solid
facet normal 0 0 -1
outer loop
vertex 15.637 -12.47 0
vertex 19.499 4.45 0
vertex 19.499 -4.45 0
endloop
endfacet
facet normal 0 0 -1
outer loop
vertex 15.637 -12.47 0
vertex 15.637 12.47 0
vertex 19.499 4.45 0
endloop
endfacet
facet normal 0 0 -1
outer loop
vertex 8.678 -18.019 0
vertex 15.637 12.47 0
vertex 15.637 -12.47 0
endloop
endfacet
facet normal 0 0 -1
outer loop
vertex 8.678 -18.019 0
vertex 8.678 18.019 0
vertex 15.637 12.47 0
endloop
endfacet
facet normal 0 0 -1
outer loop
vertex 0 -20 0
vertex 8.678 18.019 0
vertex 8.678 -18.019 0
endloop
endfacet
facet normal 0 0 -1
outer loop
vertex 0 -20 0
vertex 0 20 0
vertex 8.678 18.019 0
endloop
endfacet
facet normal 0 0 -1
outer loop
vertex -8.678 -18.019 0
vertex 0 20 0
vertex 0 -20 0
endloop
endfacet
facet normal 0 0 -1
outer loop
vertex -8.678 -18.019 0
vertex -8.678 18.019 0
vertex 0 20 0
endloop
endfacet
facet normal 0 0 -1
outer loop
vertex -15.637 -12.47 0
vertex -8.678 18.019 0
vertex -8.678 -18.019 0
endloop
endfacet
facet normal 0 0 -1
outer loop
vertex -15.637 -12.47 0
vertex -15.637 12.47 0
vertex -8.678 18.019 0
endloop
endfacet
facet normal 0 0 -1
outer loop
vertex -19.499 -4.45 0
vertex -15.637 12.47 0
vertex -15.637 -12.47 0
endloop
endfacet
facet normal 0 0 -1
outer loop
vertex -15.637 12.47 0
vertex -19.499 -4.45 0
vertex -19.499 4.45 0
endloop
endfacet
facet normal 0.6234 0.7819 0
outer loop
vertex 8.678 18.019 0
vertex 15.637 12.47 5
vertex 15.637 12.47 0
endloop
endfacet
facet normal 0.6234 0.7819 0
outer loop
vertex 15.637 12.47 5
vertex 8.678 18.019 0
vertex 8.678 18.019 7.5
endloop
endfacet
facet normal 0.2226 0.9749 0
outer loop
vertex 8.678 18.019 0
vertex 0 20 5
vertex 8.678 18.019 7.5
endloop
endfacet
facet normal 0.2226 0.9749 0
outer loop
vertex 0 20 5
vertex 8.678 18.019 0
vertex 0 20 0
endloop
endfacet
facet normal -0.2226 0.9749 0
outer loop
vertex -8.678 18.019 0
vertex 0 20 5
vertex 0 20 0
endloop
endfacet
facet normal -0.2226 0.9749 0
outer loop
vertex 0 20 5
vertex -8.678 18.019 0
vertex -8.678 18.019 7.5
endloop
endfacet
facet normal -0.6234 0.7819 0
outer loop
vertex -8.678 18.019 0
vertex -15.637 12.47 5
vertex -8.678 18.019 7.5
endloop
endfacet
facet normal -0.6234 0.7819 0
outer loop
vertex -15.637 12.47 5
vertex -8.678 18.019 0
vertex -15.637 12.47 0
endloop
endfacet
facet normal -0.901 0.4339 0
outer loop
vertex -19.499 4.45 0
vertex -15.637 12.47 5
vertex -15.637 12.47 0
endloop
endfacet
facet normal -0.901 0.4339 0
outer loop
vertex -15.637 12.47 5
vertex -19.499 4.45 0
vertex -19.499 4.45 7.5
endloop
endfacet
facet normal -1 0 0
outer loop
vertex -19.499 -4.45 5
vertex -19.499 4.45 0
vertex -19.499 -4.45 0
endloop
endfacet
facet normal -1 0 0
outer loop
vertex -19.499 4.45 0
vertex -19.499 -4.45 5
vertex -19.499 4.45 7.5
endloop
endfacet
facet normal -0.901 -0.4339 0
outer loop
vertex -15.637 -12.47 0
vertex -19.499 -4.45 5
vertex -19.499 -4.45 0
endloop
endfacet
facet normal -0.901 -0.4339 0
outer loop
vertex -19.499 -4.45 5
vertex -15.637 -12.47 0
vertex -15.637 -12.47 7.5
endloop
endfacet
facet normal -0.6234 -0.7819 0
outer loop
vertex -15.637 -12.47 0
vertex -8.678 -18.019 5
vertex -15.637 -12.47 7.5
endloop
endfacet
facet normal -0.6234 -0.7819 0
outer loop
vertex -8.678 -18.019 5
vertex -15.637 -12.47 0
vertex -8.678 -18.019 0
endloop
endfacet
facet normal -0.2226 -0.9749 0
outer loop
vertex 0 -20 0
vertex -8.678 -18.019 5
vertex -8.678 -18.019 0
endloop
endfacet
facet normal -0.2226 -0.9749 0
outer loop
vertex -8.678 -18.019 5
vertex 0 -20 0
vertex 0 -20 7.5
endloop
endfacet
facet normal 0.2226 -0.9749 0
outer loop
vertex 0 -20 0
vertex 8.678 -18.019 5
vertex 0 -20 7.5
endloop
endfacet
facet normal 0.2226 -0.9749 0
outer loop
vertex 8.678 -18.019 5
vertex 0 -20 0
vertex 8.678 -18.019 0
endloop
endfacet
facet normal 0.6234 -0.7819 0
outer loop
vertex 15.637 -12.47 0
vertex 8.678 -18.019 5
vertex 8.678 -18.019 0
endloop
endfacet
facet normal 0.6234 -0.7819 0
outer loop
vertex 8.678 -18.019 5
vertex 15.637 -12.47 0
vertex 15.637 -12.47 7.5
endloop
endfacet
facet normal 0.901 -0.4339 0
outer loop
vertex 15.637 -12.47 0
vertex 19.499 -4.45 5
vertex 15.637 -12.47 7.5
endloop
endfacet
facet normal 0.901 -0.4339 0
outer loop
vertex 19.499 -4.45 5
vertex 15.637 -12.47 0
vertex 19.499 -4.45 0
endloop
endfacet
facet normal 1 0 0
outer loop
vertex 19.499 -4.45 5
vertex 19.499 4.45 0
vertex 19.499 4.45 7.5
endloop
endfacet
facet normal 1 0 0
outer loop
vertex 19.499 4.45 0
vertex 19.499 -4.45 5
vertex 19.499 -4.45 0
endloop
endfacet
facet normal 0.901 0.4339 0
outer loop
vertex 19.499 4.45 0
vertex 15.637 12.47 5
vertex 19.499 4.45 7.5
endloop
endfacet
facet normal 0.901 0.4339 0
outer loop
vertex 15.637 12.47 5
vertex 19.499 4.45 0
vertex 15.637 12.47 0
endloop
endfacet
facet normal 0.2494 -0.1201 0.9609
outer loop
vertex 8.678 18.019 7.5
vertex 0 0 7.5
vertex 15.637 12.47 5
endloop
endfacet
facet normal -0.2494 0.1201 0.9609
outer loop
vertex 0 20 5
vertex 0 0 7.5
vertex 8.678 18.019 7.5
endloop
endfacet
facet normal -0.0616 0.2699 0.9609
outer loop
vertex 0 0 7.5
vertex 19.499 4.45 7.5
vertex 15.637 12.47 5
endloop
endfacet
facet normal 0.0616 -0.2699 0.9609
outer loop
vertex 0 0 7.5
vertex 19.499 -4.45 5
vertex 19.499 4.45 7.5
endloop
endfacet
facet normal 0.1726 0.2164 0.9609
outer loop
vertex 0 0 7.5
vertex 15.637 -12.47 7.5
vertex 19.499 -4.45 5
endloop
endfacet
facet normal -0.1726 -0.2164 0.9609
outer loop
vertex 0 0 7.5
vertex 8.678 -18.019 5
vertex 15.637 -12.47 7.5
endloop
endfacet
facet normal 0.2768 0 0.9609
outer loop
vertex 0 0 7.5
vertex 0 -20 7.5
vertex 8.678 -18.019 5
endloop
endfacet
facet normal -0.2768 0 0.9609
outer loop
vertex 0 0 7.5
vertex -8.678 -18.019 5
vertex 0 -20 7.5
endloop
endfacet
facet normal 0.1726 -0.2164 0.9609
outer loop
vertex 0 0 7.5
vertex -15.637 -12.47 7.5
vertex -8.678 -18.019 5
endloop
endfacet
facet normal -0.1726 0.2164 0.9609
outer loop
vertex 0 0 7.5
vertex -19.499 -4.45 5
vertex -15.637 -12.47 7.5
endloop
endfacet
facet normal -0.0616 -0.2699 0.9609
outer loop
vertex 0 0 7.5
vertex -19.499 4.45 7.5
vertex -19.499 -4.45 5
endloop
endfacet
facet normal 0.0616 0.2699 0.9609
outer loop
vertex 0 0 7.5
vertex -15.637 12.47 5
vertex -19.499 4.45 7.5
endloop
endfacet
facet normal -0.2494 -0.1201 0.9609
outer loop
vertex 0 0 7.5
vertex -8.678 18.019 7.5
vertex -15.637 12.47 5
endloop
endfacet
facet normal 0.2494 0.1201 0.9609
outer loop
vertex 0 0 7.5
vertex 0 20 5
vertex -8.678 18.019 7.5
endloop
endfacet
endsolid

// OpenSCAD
pointCount = 14;
radius = 20;

bottomPoints = [
    for(i = [0 : pointCount - 1]) [
        radius * sin((i / pointCount) * 360),
        radius * cos((i / pointCount) * 360),
        0
    ]
];
middlePoints = [
    for(i = [0 : 2 : pointCount - 1]) [
        radius * sin((i / pointCount) * 360),
        radius * cos((i / pointCount) * 360),
        5
    ]
];
topPoints = [
    for(i = [0 : 2 : pointCount - 1]) [
        radius * sin((i / pointCount) * 360 + 180),
        radius * cos((i / pointCount) * 360 + 180),
        7.5
    ]
];
topMiddle = [0, 0, 7.5];
bottomMiddle = [0, 0, 0];
echo(middlePoints);

allPoints = concat(bottomPoints, middlePoints, topPoints, [topMiddle, bottomMiddle]);
echo(allPoints);
    
//for (i = [0 : len(allPoints) - 1]) {
//    p = allPoints[i];
//    translate([p[0], p[1], p[2]]) {
//        sphere(.5, $fn=100);
//        translate([0, 0, 1]) rotate([90, 0, 0]) {
//            text(str(i), 1);
//        }
//    }
//}

polyhedron(points=allPoints, faces=[
    [for (i = [0 : 13]) 13 - i],

    // Wall peices
    [15, 25, 1, 2],
    [25, 14, 0, 1],
    [0, 14, 24, 13],
    [13, 24, 20, 12],
    [11, 12, 20, 23],
    [10, 11, 23, 19],
    [9, 10, 19, 22],
    [8,9, 22, 18],
    [7,8,18, 21],
    [6,7,21,17],
    [5,6,17,27],
    [4,5,27, 16],
    [3, 4, 16, 26],
    [2, 3, 26, 15],
    

    // top faces
    [15, 28, 25],
    [25, 28, 14],
    [15, 26, 28],
    [26, 16, 28],
    [16, 27, 28],
    [27, 17, 28],
    [17, 21, 28],
    [21, 18, 28],
    [18, 22, 28],
    [22, 19, 28],
    [19, 23, 28],
    [23, 20, 28],
    [20, 24, 28],
    [24, 14, 28]
    
    
    
]);
echo([0 : 13]);
